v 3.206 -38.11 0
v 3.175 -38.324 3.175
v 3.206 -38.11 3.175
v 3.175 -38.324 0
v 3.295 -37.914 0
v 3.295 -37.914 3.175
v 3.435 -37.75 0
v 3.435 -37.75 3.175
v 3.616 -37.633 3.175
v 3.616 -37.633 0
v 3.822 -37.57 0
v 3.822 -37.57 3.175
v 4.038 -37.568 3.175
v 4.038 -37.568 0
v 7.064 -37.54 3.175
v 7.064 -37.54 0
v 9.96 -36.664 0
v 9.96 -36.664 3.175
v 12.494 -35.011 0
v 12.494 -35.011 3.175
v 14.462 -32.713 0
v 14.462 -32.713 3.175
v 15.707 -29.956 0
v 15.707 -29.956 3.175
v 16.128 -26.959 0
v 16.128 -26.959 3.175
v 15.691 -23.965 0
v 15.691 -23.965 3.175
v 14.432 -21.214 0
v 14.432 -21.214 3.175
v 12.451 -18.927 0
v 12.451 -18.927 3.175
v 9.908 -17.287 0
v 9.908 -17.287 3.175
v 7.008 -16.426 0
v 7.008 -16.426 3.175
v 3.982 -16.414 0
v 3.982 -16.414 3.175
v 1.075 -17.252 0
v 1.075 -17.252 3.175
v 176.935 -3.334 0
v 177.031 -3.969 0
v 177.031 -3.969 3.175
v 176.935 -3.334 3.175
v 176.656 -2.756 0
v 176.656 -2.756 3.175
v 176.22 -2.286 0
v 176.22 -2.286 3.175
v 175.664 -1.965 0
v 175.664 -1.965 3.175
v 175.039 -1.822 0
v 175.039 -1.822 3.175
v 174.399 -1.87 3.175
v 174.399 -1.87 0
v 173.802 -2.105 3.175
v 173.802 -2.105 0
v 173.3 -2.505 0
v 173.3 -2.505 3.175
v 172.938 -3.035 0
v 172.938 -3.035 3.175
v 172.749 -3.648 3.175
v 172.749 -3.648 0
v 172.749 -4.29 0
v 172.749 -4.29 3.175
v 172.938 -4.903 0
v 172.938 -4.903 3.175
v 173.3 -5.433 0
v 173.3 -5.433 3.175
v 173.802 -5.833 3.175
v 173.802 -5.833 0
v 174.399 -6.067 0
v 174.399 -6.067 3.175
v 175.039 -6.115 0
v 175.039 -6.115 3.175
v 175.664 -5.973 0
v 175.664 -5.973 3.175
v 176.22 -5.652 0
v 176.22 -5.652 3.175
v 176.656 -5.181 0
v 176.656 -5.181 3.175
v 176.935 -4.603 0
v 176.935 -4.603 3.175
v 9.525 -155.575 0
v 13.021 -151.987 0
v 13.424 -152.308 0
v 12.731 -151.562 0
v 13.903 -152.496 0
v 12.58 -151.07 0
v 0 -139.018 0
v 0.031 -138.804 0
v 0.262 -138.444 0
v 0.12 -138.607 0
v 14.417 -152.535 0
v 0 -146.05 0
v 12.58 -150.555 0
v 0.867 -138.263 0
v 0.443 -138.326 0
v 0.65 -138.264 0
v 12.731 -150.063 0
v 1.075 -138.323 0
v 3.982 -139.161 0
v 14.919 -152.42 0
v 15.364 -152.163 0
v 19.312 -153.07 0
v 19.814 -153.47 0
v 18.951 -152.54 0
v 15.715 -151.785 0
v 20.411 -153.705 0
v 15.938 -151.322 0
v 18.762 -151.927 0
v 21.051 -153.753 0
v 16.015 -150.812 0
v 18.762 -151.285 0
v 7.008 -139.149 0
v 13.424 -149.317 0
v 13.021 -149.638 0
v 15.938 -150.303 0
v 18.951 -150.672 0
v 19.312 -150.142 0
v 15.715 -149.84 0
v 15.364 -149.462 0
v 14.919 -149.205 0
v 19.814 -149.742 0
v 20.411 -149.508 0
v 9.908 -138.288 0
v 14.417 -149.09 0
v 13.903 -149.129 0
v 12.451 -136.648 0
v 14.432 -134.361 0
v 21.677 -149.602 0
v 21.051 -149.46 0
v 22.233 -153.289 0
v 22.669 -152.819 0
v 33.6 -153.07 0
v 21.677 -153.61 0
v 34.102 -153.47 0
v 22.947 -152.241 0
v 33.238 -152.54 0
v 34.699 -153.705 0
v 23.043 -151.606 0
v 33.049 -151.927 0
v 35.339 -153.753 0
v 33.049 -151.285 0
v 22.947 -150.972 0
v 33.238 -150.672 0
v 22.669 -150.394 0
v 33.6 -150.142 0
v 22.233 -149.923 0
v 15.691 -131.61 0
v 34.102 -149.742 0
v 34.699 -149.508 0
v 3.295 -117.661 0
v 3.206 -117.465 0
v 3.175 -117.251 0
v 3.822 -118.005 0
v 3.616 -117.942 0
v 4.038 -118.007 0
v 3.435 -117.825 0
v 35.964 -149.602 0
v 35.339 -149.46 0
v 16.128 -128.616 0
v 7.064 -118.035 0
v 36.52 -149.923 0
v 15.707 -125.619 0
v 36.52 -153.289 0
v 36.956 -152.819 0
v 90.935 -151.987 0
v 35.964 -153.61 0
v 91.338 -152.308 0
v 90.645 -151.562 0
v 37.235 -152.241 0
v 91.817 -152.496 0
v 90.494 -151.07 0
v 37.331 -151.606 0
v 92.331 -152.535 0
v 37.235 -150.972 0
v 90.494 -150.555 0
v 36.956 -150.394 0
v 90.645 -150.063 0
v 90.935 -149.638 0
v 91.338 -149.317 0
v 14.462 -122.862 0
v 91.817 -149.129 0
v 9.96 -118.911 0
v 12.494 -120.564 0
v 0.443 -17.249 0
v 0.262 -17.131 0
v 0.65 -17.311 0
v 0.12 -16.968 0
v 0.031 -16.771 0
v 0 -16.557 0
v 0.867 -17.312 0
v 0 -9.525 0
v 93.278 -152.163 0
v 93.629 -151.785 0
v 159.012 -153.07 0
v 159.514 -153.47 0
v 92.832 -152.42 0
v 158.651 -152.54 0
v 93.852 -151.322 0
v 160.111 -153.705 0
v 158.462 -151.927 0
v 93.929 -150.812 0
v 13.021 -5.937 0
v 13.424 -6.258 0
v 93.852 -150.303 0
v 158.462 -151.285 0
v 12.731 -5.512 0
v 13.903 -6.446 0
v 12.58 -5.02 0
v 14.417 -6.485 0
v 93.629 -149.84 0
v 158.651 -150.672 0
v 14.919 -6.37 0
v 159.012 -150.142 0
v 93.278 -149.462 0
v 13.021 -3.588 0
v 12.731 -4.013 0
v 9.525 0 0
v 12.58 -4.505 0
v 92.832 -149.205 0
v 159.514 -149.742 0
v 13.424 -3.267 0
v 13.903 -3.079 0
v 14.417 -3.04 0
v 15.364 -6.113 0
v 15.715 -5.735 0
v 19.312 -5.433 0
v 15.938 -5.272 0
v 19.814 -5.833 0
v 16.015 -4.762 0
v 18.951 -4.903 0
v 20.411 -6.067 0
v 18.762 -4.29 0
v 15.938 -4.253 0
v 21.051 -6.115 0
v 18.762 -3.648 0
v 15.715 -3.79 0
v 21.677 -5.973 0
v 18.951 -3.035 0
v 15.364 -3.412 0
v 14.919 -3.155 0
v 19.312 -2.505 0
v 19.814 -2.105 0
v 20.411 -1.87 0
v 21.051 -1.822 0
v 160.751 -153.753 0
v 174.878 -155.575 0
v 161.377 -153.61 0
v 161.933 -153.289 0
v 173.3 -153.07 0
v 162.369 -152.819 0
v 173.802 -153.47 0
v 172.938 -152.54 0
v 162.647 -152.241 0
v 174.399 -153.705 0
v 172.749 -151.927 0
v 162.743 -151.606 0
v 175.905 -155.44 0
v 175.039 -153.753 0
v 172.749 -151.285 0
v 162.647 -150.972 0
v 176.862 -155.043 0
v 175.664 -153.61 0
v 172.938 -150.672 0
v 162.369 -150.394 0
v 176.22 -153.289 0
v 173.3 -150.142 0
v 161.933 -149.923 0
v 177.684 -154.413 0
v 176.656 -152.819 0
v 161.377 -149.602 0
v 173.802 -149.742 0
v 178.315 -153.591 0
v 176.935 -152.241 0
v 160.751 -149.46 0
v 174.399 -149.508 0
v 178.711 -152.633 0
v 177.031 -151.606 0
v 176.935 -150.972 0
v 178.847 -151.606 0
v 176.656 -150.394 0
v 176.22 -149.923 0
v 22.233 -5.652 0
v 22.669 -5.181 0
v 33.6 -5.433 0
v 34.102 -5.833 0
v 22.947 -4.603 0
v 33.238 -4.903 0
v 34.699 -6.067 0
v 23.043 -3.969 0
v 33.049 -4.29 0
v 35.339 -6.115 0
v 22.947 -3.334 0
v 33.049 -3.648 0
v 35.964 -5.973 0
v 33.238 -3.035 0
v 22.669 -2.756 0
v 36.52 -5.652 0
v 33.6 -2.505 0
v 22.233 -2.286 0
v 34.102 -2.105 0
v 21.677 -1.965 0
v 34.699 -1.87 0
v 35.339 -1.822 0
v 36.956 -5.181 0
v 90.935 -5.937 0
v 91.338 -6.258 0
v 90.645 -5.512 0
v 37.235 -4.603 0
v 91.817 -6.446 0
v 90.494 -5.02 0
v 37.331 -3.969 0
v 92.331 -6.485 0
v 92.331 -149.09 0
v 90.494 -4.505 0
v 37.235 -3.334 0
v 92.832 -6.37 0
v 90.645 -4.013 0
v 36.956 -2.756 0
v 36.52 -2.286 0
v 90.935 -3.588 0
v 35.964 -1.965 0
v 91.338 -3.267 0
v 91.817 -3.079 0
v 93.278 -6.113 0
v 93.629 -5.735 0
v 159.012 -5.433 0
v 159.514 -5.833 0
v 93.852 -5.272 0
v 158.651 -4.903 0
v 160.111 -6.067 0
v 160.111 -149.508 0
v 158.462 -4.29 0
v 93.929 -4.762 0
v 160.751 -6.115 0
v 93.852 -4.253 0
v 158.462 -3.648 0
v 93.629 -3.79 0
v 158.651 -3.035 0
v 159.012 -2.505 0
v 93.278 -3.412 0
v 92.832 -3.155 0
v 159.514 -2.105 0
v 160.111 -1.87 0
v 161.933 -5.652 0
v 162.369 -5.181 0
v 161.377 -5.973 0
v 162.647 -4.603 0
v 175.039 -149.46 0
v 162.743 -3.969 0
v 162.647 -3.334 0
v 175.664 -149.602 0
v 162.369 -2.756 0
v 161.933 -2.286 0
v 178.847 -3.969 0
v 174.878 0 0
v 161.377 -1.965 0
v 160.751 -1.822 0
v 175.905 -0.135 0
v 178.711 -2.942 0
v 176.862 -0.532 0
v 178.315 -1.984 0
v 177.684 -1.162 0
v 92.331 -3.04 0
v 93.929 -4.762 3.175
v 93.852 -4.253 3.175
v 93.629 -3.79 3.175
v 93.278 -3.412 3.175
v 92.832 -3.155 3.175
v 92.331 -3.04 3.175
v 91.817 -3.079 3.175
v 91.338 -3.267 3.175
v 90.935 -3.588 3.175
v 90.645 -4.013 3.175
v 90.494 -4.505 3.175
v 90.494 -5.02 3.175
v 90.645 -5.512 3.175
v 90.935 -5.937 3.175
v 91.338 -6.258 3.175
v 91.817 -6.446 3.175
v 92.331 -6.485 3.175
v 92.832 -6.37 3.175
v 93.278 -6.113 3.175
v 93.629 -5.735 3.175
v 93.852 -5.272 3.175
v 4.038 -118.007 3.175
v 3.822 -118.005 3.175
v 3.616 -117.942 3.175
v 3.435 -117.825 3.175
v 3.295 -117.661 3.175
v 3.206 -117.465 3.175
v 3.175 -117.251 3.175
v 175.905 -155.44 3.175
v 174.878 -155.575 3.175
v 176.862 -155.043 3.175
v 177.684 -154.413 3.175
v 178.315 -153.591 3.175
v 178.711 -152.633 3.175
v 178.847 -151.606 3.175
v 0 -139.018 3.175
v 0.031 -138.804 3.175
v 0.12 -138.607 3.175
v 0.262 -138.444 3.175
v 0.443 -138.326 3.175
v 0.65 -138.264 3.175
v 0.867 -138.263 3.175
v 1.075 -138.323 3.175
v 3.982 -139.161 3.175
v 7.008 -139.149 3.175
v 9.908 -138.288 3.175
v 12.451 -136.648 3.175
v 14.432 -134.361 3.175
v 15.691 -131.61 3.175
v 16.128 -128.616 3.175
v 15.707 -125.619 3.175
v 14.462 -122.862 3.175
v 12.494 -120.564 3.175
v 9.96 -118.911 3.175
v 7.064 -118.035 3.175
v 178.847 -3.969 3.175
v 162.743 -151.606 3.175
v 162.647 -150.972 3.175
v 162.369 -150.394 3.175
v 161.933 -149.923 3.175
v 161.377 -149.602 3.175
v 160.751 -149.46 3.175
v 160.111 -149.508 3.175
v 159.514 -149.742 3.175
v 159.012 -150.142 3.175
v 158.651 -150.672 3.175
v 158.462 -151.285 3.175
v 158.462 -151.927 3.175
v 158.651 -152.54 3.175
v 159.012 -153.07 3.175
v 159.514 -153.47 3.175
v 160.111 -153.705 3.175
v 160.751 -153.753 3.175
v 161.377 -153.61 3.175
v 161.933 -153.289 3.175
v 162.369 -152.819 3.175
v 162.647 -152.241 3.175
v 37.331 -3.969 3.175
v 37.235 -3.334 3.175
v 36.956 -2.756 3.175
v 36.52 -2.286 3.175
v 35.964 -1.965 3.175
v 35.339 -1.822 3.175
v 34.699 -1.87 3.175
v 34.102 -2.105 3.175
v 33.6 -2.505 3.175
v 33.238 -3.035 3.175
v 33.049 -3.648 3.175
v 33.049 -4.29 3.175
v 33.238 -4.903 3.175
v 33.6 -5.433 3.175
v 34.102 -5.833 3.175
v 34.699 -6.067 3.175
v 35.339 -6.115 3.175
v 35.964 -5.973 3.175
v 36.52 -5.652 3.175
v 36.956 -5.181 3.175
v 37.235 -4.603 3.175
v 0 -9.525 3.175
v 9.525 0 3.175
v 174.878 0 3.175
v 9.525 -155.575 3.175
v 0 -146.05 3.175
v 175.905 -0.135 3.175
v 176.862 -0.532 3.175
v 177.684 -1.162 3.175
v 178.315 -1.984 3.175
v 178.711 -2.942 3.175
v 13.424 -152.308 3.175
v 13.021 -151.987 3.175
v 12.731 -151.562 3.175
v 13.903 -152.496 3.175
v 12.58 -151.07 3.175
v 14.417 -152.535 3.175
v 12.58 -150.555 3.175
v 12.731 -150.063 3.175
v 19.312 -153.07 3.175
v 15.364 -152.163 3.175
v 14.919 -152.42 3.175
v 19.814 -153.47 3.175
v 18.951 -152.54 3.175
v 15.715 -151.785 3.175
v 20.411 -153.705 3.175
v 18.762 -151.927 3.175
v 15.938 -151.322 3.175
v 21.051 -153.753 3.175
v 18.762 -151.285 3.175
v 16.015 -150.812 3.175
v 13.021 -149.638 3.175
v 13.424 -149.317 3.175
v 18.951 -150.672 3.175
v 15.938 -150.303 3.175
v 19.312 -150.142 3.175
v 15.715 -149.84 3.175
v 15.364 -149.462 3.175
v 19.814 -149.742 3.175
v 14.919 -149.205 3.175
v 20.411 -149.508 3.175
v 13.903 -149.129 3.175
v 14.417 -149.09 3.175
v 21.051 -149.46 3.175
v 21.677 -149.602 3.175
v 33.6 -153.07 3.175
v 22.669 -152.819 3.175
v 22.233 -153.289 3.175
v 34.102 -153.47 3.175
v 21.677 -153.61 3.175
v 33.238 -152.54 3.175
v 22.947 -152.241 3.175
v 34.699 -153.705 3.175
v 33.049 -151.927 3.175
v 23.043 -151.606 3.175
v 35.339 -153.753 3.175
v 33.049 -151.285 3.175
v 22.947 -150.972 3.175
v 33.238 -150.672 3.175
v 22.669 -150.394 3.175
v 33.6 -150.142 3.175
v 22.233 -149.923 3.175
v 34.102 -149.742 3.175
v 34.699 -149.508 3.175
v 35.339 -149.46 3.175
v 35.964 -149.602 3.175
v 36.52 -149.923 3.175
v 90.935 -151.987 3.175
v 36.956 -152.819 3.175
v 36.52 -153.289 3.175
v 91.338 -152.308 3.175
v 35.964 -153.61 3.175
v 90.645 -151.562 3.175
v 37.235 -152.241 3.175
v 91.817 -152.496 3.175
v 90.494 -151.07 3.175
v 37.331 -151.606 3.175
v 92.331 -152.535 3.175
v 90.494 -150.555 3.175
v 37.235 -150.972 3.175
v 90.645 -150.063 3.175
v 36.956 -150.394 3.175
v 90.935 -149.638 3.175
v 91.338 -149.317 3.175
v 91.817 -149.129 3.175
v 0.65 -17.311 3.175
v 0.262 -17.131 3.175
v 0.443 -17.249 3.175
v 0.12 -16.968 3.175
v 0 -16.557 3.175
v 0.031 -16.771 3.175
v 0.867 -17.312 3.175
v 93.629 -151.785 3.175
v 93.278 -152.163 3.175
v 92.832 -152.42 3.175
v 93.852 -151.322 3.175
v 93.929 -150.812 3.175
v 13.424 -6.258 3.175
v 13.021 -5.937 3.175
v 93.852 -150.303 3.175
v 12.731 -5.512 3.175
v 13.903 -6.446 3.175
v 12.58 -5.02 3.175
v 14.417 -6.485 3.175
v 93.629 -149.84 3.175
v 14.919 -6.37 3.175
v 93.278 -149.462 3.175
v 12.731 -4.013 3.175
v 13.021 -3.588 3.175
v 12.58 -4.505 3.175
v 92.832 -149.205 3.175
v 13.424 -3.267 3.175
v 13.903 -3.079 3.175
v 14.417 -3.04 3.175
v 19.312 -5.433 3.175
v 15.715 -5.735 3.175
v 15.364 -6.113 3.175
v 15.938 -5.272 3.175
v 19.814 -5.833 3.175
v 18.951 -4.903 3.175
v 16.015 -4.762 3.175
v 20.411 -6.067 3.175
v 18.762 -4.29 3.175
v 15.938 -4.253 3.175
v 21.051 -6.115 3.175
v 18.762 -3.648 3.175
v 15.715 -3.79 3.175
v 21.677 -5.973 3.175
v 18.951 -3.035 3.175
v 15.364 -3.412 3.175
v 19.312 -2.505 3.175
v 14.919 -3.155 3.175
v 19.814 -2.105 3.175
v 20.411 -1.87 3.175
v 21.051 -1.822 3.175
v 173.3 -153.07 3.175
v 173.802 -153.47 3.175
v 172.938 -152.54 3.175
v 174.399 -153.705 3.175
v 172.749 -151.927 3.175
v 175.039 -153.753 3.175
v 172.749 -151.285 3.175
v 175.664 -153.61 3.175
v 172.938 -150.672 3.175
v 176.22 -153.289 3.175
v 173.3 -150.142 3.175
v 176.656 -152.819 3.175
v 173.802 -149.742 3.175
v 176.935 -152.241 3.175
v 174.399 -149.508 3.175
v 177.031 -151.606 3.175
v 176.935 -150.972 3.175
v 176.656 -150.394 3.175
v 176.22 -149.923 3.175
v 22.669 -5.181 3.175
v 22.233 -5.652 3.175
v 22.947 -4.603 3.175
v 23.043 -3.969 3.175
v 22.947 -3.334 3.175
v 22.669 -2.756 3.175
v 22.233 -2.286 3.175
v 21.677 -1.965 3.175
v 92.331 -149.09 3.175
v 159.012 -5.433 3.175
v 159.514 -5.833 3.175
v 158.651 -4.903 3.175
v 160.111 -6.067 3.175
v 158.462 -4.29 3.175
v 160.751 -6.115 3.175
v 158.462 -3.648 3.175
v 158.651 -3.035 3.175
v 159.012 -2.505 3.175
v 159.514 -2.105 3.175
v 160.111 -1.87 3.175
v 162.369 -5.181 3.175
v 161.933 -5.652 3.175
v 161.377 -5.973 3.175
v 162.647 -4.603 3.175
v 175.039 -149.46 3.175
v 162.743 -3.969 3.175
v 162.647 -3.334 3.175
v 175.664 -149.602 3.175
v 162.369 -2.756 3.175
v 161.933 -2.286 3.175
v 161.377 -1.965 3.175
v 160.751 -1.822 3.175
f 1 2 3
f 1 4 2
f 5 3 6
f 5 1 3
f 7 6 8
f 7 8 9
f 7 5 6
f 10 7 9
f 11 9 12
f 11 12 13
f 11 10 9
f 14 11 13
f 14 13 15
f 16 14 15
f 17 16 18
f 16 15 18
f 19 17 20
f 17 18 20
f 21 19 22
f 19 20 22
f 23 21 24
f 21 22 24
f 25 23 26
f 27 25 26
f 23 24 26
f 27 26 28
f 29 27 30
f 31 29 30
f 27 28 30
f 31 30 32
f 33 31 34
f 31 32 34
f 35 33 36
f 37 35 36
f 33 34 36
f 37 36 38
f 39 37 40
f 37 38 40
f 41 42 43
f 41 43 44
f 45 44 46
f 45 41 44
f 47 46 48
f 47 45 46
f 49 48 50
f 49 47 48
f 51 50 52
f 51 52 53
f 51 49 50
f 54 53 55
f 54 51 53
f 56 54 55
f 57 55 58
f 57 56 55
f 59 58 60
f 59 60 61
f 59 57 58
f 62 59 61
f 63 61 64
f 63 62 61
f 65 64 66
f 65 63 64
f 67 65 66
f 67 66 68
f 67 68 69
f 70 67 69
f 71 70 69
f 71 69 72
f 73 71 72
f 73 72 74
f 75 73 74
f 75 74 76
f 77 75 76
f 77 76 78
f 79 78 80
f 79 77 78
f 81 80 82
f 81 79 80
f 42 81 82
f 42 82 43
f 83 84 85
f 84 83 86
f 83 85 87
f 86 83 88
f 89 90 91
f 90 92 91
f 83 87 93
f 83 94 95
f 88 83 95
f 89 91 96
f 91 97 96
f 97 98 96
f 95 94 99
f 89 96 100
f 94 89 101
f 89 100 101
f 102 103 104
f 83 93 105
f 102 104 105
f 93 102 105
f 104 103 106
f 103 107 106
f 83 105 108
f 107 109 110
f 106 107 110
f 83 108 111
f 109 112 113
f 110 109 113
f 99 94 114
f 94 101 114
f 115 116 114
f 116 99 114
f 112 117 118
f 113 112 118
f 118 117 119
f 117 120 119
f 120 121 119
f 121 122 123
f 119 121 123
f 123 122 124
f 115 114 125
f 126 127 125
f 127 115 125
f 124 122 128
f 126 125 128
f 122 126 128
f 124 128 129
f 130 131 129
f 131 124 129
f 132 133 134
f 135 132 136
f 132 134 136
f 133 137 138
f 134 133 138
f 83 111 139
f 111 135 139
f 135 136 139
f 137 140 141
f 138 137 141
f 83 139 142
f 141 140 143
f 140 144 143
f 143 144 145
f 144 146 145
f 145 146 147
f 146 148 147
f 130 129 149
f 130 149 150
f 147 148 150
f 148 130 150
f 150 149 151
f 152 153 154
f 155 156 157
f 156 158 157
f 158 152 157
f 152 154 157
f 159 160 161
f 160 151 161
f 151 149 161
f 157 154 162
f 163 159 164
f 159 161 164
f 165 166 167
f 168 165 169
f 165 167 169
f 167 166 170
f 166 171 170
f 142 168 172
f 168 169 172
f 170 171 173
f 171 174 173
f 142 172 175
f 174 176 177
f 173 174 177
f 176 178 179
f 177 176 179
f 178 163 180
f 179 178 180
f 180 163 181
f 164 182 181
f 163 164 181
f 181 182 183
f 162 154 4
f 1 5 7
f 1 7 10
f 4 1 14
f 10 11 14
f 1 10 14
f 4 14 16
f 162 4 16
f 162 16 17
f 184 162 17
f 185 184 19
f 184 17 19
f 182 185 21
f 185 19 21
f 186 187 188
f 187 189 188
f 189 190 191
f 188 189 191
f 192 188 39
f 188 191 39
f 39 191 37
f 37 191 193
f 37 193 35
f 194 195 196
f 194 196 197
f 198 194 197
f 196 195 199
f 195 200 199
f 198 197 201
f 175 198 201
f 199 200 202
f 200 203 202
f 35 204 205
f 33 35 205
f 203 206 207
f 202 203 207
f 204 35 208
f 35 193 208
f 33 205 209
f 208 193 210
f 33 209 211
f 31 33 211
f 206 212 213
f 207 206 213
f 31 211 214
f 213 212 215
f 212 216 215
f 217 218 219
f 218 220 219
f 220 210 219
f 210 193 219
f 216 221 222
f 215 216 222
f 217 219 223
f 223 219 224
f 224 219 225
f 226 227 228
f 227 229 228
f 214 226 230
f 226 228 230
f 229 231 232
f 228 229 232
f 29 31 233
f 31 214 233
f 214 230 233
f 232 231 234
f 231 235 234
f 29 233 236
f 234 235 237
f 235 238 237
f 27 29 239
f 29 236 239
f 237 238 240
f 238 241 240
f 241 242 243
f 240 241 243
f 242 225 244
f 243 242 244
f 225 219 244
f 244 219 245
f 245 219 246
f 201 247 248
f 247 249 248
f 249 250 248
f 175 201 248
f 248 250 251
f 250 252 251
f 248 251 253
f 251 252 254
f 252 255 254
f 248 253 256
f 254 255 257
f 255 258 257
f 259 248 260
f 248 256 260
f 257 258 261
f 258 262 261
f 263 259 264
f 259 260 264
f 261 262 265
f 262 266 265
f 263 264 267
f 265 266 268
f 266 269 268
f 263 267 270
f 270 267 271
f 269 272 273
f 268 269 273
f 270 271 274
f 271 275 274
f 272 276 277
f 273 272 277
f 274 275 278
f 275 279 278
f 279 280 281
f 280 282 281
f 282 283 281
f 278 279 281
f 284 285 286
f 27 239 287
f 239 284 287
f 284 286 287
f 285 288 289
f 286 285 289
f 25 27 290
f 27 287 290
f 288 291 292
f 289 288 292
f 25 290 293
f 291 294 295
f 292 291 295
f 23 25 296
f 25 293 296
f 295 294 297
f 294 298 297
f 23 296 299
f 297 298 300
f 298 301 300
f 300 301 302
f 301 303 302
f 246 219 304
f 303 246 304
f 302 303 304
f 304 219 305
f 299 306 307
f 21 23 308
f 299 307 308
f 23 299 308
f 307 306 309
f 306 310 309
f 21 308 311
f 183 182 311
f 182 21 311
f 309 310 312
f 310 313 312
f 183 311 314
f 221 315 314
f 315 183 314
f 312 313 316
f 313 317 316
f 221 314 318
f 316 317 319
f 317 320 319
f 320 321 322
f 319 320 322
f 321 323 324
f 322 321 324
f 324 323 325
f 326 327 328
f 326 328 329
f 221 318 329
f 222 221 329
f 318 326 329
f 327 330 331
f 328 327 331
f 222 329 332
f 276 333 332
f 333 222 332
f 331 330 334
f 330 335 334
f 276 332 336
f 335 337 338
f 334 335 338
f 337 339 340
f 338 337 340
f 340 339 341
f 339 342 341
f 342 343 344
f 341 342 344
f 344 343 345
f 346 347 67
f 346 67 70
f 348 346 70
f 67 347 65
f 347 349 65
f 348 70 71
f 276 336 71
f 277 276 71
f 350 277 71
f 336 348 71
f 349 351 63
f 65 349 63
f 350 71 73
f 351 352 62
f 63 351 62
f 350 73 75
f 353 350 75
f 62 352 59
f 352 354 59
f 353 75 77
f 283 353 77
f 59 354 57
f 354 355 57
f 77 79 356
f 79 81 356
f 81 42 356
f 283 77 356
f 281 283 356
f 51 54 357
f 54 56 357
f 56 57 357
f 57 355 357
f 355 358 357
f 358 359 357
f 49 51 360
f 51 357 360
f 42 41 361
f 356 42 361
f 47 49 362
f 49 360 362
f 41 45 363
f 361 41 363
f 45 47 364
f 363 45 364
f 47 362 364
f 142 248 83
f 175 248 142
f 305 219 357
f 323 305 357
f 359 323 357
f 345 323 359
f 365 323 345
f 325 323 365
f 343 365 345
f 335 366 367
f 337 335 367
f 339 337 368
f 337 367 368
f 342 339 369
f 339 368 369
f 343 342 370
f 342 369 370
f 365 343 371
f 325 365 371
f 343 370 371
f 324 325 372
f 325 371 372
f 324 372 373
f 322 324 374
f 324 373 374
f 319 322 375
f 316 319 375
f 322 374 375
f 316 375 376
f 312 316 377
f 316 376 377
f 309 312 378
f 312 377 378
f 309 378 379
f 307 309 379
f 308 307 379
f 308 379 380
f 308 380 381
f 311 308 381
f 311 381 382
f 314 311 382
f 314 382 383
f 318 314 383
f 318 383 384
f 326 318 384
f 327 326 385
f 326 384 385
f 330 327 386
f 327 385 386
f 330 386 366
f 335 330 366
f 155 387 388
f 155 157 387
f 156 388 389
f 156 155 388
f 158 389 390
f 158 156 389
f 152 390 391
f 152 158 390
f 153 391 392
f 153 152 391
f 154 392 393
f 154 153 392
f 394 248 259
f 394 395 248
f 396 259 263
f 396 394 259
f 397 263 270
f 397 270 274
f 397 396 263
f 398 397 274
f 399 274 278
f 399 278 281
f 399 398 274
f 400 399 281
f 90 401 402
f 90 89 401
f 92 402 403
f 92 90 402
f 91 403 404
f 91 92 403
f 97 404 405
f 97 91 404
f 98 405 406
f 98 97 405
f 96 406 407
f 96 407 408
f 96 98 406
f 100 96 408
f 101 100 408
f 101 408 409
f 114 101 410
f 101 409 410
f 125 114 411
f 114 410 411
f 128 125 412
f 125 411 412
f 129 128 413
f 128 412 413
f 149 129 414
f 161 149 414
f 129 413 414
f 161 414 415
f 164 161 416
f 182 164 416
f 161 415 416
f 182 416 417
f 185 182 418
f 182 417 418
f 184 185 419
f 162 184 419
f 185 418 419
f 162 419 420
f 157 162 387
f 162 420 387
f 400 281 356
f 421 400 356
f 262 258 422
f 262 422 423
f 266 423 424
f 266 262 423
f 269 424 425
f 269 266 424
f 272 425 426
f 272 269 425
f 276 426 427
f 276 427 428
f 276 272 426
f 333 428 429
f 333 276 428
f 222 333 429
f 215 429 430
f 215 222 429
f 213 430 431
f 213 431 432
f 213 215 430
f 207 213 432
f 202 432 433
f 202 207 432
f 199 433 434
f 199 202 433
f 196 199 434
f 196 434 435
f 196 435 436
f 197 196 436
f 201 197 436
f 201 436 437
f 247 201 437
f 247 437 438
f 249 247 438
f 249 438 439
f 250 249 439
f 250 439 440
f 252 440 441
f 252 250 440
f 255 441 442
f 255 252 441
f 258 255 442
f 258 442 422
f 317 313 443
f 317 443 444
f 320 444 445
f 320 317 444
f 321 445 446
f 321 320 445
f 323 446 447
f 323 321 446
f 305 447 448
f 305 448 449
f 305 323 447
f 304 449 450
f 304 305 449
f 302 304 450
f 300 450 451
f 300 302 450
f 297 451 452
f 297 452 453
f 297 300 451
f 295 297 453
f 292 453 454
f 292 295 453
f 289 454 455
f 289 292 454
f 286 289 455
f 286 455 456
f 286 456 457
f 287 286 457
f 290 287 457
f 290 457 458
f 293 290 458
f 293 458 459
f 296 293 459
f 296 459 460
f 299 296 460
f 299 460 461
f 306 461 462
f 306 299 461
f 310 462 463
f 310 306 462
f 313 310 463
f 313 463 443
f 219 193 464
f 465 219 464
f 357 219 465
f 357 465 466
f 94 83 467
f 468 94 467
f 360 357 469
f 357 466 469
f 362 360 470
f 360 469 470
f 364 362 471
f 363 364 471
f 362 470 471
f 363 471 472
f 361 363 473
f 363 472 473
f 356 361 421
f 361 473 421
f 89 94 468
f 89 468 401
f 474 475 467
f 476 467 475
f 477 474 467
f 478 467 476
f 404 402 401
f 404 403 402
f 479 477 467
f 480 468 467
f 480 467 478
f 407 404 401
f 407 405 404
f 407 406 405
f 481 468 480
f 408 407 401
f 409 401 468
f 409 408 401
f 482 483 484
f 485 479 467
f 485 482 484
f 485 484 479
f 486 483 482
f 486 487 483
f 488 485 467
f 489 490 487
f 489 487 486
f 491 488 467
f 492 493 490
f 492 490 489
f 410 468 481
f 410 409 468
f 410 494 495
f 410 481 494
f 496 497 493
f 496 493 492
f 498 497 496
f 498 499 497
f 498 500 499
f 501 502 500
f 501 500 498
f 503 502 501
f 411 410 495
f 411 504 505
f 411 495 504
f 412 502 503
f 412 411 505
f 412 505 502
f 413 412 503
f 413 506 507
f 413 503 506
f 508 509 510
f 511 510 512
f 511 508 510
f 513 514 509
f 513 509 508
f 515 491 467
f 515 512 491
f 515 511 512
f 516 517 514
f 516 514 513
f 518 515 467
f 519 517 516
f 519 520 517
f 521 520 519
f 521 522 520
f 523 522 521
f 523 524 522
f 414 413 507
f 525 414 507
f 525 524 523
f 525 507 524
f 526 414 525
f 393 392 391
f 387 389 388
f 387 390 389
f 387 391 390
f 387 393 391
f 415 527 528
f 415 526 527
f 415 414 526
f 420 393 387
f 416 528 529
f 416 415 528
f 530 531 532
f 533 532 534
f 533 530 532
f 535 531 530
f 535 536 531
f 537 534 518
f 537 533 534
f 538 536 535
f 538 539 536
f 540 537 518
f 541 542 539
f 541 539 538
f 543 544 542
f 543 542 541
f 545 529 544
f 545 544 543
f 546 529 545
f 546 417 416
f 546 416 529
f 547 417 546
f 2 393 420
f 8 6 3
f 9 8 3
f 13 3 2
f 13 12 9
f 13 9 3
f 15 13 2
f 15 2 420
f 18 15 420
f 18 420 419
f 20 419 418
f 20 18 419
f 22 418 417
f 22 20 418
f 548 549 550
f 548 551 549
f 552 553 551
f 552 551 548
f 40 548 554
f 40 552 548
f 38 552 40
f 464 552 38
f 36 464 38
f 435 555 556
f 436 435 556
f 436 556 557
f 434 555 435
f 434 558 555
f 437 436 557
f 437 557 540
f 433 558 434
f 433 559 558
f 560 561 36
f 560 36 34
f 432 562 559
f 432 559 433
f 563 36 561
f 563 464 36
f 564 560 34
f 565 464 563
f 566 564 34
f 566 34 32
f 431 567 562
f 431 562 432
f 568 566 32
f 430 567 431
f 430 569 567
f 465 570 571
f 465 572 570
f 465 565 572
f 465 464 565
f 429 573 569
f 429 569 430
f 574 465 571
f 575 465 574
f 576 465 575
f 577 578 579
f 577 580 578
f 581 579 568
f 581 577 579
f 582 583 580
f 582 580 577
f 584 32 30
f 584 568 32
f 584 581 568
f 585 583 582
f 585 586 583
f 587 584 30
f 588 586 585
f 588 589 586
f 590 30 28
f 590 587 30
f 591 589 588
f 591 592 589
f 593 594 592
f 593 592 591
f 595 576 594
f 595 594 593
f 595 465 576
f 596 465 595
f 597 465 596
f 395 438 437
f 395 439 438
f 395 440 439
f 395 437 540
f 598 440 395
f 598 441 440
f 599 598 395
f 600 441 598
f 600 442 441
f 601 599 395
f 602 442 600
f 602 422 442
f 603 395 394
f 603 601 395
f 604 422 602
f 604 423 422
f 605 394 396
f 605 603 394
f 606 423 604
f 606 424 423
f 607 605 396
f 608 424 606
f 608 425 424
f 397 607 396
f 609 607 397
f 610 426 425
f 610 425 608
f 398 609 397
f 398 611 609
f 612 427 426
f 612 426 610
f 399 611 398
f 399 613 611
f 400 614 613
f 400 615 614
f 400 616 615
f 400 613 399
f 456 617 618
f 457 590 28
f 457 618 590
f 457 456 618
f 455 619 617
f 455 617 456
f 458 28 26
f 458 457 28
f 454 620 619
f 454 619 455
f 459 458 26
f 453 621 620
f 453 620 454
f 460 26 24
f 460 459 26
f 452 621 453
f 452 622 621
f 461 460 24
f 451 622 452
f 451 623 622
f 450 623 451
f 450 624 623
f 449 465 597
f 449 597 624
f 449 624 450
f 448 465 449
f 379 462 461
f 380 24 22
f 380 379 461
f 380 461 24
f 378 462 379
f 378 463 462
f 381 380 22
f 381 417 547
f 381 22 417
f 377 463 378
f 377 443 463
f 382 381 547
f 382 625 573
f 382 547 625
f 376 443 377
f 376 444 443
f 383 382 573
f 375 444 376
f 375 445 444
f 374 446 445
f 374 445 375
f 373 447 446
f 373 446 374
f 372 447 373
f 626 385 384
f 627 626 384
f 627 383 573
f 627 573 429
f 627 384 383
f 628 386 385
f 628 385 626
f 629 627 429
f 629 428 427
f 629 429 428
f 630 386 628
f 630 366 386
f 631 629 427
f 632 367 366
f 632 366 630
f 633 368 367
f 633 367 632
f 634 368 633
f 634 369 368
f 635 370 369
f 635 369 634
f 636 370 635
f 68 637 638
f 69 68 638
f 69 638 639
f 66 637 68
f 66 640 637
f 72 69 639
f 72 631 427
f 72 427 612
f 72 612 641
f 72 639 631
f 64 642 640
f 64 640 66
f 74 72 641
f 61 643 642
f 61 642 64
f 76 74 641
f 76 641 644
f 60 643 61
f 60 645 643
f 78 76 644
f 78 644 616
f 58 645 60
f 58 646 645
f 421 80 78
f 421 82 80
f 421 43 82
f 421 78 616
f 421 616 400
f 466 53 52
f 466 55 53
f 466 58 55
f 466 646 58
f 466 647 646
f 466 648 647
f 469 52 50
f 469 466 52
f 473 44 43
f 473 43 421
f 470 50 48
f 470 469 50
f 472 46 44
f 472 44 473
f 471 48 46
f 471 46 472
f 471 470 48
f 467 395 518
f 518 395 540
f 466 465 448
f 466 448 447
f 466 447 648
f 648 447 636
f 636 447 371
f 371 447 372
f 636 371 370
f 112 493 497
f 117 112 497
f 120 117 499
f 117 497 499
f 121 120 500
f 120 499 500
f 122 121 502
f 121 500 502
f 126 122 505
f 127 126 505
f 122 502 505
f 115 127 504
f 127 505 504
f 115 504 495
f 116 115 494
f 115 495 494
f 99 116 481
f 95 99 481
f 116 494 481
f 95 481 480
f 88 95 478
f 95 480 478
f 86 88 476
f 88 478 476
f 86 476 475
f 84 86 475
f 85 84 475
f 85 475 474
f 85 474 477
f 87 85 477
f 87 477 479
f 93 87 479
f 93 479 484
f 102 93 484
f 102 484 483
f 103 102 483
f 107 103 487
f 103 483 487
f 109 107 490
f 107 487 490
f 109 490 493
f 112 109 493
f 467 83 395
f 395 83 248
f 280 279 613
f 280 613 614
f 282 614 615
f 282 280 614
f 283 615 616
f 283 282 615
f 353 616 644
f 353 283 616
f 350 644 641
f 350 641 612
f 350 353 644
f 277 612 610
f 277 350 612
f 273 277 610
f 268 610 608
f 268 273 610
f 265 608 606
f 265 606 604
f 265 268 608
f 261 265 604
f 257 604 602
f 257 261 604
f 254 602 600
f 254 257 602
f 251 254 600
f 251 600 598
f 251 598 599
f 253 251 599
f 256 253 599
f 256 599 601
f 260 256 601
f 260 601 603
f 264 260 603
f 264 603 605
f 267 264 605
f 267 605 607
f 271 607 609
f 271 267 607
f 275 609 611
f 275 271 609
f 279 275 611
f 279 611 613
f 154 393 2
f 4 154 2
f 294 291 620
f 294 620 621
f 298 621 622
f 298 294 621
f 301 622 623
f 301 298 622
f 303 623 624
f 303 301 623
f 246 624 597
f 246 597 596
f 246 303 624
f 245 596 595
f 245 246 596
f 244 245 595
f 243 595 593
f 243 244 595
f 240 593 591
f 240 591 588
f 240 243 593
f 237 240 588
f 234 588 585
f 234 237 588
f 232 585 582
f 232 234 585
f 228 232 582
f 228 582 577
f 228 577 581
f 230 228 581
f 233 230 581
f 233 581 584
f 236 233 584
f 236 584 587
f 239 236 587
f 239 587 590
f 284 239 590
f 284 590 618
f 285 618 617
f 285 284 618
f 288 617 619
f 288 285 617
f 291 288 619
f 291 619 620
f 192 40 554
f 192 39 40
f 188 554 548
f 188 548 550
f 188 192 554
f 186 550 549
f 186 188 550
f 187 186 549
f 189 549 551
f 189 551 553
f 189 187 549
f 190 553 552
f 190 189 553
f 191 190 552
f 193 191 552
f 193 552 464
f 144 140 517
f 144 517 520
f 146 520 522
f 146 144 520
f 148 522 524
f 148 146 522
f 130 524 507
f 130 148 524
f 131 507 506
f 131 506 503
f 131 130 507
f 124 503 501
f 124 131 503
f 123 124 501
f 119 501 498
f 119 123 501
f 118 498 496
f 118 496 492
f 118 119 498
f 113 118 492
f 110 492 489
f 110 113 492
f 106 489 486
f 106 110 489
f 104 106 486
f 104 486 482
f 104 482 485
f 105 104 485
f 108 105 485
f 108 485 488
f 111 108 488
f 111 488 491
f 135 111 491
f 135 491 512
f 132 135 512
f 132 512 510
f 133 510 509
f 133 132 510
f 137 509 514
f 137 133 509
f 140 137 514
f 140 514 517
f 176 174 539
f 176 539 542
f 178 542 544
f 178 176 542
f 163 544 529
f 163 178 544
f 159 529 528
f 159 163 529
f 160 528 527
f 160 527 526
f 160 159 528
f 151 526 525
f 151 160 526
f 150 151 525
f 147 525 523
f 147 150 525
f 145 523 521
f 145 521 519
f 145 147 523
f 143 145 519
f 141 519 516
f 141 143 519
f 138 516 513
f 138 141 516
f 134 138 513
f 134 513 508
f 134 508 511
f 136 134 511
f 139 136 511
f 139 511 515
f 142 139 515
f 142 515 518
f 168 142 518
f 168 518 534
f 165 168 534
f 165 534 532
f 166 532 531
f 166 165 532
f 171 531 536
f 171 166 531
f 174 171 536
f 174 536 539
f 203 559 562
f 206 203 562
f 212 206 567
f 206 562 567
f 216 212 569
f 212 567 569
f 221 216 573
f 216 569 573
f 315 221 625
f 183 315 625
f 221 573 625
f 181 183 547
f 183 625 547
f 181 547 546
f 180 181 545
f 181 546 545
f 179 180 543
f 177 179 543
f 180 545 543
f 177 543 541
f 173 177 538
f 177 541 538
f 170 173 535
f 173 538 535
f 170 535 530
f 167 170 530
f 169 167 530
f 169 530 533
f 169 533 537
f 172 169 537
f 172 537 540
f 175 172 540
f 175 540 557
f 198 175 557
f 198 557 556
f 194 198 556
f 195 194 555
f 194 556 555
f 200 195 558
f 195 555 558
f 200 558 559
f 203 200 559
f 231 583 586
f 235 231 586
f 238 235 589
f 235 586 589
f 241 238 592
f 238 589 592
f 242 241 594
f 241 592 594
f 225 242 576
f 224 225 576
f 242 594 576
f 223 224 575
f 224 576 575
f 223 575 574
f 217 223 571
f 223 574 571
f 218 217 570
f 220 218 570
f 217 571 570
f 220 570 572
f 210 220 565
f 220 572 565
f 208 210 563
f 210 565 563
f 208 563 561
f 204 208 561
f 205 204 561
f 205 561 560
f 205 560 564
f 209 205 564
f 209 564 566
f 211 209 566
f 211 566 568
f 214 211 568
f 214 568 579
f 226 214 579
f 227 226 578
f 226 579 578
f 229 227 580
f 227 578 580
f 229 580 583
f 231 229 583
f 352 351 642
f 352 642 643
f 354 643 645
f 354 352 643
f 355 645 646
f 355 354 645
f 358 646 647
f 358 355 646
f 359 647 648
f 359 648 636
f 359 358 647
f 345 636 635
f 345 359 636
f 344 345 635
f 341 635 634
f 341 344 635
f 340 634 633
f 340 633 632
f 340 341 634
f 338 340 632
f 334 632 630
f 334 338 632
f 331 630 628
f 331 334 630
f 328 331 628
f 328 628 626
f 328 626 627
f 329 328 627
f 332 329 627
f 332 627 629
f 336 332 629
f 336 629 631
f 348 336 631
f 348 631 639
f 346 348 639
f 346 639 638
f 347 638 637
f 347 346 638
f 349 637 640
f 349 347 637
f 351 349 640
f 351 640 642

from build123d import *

# Parameters (mm, degrees)
F0_W     = 178.8466324
F0_H     = 155.575
F0_R     = 2.15265
F1_DEPTH = 3.175
F2_R     = 3.96875
F4_DEPTH = 3.175
F5_R     = 0.762
F6_SIZE  = 9.525
F7_R     = 1.7272
F8_DEPTH = 3.175


with BuildPart() as f1:
    # F0 (on Top) → F1 (new body)
    with BuildSketch(Plane.XY):
        with Locations((89.4233162, -77.7875)):
            Rectangle(F0_W, F0_H)
        with Locations((20.8903824, -151.60625)):
            Circle(F0_R, mode=Mode.SUBTRACT)
        with Locations((35.1778824, -151.60625)):
            Circle(F0_R, mode=Mode.SUBTRACT)
        with Locations((160.5903824, -151.60625)):
            Circle(F0_R, mode=Mode.SUBTRACT)
        with Locations((174.8778824, -151.60625)):
            Circle(F0_R, mode=Mode.SUBTRACT)
        with Locations((20.8903824, -3.96875)):
            Circle(F0_R, mode=Mode.SUBTRACT)
        with Locations((35.1778824, -3.96875)):
            Circle(F0_R, mode=Mode.SUBTRACT)
        with Locations((160.5903824, -3.96875)):
            Circle(F0_R, mode=Mode.SUBTRACT)
        with Locations((174.8778824, -3.96875)):
            Circle(F0_R, mode=Mode.SUBTRACT)
    extrude(amount=F1_DEPTH)

    # F2
    f2_edges = [f1.edges().sort_by_distance(p)[0] for p in [
        (178.846632, 0, 1.5875),
        (178.846632, -155.575, 1.5875),
    ]]
    fillet(f2_edges, radius=F2_R)

    # F3 (on face) → F4 (cut, through all)
    with BuildSketch(Plane.XY.offset(3.175)):
        with BuildLine():
            Line((0, -17.8102557702), (0, -137.7647442298))
            ThreePointArc((0, -137.7647442298), (15.9905975048, -130.293948325), (3.175, -118.1583617876))
            Line((3.175, -118.1583617876), (3.175, -37.4166382124))
            ThreePointArc((3.175, -37.4166382124), (15.9905975048, -25.281051675), (0, -17.8102557702))
        make_face()
    extrude(amount=-F4_DEPTH, mode=Mode.SUBTRACT)

    # F5
    f5_edges = [f1.edges().sort_by_distance(p)[0] for p in [
        (0, -17.810256, 1.5875),
        (0, -137.764744, 1.5875),
        (3.175, -37.416638, 1.5875),
        (3.175, -118.158362, 1.5875),
    ]]
    fillet(f5_edges, radius=F5_R)

    # F6
    f6_edges = [f1.edges().sort_by_distance(p)[0] for p in [
        (0, 0, 1.5875),
        (0, -155.575, 1.5875),
    ]]
    chamfer(f6_edges, length=F6_SIZE)

    # F7 (on face) → F8 (cut, through all)
    with BuildSketch(Plane.XY.offset(3.175)):
        with Locations((92.2014412, -4.7625)):
            Circle(F7_R)
        with Locations((14.2875, -4.7625)):
            Circle(F7_R)
        with Locations((14.2875, -150.8125)):
            Circle(F7_R)
        with Locations((92.2014412, -150.8125)):
            Circle(F7_R)
    extrude(amount=-F8_DEPTH, mode=Mode.SUBTRACT)


solid = f1.part
